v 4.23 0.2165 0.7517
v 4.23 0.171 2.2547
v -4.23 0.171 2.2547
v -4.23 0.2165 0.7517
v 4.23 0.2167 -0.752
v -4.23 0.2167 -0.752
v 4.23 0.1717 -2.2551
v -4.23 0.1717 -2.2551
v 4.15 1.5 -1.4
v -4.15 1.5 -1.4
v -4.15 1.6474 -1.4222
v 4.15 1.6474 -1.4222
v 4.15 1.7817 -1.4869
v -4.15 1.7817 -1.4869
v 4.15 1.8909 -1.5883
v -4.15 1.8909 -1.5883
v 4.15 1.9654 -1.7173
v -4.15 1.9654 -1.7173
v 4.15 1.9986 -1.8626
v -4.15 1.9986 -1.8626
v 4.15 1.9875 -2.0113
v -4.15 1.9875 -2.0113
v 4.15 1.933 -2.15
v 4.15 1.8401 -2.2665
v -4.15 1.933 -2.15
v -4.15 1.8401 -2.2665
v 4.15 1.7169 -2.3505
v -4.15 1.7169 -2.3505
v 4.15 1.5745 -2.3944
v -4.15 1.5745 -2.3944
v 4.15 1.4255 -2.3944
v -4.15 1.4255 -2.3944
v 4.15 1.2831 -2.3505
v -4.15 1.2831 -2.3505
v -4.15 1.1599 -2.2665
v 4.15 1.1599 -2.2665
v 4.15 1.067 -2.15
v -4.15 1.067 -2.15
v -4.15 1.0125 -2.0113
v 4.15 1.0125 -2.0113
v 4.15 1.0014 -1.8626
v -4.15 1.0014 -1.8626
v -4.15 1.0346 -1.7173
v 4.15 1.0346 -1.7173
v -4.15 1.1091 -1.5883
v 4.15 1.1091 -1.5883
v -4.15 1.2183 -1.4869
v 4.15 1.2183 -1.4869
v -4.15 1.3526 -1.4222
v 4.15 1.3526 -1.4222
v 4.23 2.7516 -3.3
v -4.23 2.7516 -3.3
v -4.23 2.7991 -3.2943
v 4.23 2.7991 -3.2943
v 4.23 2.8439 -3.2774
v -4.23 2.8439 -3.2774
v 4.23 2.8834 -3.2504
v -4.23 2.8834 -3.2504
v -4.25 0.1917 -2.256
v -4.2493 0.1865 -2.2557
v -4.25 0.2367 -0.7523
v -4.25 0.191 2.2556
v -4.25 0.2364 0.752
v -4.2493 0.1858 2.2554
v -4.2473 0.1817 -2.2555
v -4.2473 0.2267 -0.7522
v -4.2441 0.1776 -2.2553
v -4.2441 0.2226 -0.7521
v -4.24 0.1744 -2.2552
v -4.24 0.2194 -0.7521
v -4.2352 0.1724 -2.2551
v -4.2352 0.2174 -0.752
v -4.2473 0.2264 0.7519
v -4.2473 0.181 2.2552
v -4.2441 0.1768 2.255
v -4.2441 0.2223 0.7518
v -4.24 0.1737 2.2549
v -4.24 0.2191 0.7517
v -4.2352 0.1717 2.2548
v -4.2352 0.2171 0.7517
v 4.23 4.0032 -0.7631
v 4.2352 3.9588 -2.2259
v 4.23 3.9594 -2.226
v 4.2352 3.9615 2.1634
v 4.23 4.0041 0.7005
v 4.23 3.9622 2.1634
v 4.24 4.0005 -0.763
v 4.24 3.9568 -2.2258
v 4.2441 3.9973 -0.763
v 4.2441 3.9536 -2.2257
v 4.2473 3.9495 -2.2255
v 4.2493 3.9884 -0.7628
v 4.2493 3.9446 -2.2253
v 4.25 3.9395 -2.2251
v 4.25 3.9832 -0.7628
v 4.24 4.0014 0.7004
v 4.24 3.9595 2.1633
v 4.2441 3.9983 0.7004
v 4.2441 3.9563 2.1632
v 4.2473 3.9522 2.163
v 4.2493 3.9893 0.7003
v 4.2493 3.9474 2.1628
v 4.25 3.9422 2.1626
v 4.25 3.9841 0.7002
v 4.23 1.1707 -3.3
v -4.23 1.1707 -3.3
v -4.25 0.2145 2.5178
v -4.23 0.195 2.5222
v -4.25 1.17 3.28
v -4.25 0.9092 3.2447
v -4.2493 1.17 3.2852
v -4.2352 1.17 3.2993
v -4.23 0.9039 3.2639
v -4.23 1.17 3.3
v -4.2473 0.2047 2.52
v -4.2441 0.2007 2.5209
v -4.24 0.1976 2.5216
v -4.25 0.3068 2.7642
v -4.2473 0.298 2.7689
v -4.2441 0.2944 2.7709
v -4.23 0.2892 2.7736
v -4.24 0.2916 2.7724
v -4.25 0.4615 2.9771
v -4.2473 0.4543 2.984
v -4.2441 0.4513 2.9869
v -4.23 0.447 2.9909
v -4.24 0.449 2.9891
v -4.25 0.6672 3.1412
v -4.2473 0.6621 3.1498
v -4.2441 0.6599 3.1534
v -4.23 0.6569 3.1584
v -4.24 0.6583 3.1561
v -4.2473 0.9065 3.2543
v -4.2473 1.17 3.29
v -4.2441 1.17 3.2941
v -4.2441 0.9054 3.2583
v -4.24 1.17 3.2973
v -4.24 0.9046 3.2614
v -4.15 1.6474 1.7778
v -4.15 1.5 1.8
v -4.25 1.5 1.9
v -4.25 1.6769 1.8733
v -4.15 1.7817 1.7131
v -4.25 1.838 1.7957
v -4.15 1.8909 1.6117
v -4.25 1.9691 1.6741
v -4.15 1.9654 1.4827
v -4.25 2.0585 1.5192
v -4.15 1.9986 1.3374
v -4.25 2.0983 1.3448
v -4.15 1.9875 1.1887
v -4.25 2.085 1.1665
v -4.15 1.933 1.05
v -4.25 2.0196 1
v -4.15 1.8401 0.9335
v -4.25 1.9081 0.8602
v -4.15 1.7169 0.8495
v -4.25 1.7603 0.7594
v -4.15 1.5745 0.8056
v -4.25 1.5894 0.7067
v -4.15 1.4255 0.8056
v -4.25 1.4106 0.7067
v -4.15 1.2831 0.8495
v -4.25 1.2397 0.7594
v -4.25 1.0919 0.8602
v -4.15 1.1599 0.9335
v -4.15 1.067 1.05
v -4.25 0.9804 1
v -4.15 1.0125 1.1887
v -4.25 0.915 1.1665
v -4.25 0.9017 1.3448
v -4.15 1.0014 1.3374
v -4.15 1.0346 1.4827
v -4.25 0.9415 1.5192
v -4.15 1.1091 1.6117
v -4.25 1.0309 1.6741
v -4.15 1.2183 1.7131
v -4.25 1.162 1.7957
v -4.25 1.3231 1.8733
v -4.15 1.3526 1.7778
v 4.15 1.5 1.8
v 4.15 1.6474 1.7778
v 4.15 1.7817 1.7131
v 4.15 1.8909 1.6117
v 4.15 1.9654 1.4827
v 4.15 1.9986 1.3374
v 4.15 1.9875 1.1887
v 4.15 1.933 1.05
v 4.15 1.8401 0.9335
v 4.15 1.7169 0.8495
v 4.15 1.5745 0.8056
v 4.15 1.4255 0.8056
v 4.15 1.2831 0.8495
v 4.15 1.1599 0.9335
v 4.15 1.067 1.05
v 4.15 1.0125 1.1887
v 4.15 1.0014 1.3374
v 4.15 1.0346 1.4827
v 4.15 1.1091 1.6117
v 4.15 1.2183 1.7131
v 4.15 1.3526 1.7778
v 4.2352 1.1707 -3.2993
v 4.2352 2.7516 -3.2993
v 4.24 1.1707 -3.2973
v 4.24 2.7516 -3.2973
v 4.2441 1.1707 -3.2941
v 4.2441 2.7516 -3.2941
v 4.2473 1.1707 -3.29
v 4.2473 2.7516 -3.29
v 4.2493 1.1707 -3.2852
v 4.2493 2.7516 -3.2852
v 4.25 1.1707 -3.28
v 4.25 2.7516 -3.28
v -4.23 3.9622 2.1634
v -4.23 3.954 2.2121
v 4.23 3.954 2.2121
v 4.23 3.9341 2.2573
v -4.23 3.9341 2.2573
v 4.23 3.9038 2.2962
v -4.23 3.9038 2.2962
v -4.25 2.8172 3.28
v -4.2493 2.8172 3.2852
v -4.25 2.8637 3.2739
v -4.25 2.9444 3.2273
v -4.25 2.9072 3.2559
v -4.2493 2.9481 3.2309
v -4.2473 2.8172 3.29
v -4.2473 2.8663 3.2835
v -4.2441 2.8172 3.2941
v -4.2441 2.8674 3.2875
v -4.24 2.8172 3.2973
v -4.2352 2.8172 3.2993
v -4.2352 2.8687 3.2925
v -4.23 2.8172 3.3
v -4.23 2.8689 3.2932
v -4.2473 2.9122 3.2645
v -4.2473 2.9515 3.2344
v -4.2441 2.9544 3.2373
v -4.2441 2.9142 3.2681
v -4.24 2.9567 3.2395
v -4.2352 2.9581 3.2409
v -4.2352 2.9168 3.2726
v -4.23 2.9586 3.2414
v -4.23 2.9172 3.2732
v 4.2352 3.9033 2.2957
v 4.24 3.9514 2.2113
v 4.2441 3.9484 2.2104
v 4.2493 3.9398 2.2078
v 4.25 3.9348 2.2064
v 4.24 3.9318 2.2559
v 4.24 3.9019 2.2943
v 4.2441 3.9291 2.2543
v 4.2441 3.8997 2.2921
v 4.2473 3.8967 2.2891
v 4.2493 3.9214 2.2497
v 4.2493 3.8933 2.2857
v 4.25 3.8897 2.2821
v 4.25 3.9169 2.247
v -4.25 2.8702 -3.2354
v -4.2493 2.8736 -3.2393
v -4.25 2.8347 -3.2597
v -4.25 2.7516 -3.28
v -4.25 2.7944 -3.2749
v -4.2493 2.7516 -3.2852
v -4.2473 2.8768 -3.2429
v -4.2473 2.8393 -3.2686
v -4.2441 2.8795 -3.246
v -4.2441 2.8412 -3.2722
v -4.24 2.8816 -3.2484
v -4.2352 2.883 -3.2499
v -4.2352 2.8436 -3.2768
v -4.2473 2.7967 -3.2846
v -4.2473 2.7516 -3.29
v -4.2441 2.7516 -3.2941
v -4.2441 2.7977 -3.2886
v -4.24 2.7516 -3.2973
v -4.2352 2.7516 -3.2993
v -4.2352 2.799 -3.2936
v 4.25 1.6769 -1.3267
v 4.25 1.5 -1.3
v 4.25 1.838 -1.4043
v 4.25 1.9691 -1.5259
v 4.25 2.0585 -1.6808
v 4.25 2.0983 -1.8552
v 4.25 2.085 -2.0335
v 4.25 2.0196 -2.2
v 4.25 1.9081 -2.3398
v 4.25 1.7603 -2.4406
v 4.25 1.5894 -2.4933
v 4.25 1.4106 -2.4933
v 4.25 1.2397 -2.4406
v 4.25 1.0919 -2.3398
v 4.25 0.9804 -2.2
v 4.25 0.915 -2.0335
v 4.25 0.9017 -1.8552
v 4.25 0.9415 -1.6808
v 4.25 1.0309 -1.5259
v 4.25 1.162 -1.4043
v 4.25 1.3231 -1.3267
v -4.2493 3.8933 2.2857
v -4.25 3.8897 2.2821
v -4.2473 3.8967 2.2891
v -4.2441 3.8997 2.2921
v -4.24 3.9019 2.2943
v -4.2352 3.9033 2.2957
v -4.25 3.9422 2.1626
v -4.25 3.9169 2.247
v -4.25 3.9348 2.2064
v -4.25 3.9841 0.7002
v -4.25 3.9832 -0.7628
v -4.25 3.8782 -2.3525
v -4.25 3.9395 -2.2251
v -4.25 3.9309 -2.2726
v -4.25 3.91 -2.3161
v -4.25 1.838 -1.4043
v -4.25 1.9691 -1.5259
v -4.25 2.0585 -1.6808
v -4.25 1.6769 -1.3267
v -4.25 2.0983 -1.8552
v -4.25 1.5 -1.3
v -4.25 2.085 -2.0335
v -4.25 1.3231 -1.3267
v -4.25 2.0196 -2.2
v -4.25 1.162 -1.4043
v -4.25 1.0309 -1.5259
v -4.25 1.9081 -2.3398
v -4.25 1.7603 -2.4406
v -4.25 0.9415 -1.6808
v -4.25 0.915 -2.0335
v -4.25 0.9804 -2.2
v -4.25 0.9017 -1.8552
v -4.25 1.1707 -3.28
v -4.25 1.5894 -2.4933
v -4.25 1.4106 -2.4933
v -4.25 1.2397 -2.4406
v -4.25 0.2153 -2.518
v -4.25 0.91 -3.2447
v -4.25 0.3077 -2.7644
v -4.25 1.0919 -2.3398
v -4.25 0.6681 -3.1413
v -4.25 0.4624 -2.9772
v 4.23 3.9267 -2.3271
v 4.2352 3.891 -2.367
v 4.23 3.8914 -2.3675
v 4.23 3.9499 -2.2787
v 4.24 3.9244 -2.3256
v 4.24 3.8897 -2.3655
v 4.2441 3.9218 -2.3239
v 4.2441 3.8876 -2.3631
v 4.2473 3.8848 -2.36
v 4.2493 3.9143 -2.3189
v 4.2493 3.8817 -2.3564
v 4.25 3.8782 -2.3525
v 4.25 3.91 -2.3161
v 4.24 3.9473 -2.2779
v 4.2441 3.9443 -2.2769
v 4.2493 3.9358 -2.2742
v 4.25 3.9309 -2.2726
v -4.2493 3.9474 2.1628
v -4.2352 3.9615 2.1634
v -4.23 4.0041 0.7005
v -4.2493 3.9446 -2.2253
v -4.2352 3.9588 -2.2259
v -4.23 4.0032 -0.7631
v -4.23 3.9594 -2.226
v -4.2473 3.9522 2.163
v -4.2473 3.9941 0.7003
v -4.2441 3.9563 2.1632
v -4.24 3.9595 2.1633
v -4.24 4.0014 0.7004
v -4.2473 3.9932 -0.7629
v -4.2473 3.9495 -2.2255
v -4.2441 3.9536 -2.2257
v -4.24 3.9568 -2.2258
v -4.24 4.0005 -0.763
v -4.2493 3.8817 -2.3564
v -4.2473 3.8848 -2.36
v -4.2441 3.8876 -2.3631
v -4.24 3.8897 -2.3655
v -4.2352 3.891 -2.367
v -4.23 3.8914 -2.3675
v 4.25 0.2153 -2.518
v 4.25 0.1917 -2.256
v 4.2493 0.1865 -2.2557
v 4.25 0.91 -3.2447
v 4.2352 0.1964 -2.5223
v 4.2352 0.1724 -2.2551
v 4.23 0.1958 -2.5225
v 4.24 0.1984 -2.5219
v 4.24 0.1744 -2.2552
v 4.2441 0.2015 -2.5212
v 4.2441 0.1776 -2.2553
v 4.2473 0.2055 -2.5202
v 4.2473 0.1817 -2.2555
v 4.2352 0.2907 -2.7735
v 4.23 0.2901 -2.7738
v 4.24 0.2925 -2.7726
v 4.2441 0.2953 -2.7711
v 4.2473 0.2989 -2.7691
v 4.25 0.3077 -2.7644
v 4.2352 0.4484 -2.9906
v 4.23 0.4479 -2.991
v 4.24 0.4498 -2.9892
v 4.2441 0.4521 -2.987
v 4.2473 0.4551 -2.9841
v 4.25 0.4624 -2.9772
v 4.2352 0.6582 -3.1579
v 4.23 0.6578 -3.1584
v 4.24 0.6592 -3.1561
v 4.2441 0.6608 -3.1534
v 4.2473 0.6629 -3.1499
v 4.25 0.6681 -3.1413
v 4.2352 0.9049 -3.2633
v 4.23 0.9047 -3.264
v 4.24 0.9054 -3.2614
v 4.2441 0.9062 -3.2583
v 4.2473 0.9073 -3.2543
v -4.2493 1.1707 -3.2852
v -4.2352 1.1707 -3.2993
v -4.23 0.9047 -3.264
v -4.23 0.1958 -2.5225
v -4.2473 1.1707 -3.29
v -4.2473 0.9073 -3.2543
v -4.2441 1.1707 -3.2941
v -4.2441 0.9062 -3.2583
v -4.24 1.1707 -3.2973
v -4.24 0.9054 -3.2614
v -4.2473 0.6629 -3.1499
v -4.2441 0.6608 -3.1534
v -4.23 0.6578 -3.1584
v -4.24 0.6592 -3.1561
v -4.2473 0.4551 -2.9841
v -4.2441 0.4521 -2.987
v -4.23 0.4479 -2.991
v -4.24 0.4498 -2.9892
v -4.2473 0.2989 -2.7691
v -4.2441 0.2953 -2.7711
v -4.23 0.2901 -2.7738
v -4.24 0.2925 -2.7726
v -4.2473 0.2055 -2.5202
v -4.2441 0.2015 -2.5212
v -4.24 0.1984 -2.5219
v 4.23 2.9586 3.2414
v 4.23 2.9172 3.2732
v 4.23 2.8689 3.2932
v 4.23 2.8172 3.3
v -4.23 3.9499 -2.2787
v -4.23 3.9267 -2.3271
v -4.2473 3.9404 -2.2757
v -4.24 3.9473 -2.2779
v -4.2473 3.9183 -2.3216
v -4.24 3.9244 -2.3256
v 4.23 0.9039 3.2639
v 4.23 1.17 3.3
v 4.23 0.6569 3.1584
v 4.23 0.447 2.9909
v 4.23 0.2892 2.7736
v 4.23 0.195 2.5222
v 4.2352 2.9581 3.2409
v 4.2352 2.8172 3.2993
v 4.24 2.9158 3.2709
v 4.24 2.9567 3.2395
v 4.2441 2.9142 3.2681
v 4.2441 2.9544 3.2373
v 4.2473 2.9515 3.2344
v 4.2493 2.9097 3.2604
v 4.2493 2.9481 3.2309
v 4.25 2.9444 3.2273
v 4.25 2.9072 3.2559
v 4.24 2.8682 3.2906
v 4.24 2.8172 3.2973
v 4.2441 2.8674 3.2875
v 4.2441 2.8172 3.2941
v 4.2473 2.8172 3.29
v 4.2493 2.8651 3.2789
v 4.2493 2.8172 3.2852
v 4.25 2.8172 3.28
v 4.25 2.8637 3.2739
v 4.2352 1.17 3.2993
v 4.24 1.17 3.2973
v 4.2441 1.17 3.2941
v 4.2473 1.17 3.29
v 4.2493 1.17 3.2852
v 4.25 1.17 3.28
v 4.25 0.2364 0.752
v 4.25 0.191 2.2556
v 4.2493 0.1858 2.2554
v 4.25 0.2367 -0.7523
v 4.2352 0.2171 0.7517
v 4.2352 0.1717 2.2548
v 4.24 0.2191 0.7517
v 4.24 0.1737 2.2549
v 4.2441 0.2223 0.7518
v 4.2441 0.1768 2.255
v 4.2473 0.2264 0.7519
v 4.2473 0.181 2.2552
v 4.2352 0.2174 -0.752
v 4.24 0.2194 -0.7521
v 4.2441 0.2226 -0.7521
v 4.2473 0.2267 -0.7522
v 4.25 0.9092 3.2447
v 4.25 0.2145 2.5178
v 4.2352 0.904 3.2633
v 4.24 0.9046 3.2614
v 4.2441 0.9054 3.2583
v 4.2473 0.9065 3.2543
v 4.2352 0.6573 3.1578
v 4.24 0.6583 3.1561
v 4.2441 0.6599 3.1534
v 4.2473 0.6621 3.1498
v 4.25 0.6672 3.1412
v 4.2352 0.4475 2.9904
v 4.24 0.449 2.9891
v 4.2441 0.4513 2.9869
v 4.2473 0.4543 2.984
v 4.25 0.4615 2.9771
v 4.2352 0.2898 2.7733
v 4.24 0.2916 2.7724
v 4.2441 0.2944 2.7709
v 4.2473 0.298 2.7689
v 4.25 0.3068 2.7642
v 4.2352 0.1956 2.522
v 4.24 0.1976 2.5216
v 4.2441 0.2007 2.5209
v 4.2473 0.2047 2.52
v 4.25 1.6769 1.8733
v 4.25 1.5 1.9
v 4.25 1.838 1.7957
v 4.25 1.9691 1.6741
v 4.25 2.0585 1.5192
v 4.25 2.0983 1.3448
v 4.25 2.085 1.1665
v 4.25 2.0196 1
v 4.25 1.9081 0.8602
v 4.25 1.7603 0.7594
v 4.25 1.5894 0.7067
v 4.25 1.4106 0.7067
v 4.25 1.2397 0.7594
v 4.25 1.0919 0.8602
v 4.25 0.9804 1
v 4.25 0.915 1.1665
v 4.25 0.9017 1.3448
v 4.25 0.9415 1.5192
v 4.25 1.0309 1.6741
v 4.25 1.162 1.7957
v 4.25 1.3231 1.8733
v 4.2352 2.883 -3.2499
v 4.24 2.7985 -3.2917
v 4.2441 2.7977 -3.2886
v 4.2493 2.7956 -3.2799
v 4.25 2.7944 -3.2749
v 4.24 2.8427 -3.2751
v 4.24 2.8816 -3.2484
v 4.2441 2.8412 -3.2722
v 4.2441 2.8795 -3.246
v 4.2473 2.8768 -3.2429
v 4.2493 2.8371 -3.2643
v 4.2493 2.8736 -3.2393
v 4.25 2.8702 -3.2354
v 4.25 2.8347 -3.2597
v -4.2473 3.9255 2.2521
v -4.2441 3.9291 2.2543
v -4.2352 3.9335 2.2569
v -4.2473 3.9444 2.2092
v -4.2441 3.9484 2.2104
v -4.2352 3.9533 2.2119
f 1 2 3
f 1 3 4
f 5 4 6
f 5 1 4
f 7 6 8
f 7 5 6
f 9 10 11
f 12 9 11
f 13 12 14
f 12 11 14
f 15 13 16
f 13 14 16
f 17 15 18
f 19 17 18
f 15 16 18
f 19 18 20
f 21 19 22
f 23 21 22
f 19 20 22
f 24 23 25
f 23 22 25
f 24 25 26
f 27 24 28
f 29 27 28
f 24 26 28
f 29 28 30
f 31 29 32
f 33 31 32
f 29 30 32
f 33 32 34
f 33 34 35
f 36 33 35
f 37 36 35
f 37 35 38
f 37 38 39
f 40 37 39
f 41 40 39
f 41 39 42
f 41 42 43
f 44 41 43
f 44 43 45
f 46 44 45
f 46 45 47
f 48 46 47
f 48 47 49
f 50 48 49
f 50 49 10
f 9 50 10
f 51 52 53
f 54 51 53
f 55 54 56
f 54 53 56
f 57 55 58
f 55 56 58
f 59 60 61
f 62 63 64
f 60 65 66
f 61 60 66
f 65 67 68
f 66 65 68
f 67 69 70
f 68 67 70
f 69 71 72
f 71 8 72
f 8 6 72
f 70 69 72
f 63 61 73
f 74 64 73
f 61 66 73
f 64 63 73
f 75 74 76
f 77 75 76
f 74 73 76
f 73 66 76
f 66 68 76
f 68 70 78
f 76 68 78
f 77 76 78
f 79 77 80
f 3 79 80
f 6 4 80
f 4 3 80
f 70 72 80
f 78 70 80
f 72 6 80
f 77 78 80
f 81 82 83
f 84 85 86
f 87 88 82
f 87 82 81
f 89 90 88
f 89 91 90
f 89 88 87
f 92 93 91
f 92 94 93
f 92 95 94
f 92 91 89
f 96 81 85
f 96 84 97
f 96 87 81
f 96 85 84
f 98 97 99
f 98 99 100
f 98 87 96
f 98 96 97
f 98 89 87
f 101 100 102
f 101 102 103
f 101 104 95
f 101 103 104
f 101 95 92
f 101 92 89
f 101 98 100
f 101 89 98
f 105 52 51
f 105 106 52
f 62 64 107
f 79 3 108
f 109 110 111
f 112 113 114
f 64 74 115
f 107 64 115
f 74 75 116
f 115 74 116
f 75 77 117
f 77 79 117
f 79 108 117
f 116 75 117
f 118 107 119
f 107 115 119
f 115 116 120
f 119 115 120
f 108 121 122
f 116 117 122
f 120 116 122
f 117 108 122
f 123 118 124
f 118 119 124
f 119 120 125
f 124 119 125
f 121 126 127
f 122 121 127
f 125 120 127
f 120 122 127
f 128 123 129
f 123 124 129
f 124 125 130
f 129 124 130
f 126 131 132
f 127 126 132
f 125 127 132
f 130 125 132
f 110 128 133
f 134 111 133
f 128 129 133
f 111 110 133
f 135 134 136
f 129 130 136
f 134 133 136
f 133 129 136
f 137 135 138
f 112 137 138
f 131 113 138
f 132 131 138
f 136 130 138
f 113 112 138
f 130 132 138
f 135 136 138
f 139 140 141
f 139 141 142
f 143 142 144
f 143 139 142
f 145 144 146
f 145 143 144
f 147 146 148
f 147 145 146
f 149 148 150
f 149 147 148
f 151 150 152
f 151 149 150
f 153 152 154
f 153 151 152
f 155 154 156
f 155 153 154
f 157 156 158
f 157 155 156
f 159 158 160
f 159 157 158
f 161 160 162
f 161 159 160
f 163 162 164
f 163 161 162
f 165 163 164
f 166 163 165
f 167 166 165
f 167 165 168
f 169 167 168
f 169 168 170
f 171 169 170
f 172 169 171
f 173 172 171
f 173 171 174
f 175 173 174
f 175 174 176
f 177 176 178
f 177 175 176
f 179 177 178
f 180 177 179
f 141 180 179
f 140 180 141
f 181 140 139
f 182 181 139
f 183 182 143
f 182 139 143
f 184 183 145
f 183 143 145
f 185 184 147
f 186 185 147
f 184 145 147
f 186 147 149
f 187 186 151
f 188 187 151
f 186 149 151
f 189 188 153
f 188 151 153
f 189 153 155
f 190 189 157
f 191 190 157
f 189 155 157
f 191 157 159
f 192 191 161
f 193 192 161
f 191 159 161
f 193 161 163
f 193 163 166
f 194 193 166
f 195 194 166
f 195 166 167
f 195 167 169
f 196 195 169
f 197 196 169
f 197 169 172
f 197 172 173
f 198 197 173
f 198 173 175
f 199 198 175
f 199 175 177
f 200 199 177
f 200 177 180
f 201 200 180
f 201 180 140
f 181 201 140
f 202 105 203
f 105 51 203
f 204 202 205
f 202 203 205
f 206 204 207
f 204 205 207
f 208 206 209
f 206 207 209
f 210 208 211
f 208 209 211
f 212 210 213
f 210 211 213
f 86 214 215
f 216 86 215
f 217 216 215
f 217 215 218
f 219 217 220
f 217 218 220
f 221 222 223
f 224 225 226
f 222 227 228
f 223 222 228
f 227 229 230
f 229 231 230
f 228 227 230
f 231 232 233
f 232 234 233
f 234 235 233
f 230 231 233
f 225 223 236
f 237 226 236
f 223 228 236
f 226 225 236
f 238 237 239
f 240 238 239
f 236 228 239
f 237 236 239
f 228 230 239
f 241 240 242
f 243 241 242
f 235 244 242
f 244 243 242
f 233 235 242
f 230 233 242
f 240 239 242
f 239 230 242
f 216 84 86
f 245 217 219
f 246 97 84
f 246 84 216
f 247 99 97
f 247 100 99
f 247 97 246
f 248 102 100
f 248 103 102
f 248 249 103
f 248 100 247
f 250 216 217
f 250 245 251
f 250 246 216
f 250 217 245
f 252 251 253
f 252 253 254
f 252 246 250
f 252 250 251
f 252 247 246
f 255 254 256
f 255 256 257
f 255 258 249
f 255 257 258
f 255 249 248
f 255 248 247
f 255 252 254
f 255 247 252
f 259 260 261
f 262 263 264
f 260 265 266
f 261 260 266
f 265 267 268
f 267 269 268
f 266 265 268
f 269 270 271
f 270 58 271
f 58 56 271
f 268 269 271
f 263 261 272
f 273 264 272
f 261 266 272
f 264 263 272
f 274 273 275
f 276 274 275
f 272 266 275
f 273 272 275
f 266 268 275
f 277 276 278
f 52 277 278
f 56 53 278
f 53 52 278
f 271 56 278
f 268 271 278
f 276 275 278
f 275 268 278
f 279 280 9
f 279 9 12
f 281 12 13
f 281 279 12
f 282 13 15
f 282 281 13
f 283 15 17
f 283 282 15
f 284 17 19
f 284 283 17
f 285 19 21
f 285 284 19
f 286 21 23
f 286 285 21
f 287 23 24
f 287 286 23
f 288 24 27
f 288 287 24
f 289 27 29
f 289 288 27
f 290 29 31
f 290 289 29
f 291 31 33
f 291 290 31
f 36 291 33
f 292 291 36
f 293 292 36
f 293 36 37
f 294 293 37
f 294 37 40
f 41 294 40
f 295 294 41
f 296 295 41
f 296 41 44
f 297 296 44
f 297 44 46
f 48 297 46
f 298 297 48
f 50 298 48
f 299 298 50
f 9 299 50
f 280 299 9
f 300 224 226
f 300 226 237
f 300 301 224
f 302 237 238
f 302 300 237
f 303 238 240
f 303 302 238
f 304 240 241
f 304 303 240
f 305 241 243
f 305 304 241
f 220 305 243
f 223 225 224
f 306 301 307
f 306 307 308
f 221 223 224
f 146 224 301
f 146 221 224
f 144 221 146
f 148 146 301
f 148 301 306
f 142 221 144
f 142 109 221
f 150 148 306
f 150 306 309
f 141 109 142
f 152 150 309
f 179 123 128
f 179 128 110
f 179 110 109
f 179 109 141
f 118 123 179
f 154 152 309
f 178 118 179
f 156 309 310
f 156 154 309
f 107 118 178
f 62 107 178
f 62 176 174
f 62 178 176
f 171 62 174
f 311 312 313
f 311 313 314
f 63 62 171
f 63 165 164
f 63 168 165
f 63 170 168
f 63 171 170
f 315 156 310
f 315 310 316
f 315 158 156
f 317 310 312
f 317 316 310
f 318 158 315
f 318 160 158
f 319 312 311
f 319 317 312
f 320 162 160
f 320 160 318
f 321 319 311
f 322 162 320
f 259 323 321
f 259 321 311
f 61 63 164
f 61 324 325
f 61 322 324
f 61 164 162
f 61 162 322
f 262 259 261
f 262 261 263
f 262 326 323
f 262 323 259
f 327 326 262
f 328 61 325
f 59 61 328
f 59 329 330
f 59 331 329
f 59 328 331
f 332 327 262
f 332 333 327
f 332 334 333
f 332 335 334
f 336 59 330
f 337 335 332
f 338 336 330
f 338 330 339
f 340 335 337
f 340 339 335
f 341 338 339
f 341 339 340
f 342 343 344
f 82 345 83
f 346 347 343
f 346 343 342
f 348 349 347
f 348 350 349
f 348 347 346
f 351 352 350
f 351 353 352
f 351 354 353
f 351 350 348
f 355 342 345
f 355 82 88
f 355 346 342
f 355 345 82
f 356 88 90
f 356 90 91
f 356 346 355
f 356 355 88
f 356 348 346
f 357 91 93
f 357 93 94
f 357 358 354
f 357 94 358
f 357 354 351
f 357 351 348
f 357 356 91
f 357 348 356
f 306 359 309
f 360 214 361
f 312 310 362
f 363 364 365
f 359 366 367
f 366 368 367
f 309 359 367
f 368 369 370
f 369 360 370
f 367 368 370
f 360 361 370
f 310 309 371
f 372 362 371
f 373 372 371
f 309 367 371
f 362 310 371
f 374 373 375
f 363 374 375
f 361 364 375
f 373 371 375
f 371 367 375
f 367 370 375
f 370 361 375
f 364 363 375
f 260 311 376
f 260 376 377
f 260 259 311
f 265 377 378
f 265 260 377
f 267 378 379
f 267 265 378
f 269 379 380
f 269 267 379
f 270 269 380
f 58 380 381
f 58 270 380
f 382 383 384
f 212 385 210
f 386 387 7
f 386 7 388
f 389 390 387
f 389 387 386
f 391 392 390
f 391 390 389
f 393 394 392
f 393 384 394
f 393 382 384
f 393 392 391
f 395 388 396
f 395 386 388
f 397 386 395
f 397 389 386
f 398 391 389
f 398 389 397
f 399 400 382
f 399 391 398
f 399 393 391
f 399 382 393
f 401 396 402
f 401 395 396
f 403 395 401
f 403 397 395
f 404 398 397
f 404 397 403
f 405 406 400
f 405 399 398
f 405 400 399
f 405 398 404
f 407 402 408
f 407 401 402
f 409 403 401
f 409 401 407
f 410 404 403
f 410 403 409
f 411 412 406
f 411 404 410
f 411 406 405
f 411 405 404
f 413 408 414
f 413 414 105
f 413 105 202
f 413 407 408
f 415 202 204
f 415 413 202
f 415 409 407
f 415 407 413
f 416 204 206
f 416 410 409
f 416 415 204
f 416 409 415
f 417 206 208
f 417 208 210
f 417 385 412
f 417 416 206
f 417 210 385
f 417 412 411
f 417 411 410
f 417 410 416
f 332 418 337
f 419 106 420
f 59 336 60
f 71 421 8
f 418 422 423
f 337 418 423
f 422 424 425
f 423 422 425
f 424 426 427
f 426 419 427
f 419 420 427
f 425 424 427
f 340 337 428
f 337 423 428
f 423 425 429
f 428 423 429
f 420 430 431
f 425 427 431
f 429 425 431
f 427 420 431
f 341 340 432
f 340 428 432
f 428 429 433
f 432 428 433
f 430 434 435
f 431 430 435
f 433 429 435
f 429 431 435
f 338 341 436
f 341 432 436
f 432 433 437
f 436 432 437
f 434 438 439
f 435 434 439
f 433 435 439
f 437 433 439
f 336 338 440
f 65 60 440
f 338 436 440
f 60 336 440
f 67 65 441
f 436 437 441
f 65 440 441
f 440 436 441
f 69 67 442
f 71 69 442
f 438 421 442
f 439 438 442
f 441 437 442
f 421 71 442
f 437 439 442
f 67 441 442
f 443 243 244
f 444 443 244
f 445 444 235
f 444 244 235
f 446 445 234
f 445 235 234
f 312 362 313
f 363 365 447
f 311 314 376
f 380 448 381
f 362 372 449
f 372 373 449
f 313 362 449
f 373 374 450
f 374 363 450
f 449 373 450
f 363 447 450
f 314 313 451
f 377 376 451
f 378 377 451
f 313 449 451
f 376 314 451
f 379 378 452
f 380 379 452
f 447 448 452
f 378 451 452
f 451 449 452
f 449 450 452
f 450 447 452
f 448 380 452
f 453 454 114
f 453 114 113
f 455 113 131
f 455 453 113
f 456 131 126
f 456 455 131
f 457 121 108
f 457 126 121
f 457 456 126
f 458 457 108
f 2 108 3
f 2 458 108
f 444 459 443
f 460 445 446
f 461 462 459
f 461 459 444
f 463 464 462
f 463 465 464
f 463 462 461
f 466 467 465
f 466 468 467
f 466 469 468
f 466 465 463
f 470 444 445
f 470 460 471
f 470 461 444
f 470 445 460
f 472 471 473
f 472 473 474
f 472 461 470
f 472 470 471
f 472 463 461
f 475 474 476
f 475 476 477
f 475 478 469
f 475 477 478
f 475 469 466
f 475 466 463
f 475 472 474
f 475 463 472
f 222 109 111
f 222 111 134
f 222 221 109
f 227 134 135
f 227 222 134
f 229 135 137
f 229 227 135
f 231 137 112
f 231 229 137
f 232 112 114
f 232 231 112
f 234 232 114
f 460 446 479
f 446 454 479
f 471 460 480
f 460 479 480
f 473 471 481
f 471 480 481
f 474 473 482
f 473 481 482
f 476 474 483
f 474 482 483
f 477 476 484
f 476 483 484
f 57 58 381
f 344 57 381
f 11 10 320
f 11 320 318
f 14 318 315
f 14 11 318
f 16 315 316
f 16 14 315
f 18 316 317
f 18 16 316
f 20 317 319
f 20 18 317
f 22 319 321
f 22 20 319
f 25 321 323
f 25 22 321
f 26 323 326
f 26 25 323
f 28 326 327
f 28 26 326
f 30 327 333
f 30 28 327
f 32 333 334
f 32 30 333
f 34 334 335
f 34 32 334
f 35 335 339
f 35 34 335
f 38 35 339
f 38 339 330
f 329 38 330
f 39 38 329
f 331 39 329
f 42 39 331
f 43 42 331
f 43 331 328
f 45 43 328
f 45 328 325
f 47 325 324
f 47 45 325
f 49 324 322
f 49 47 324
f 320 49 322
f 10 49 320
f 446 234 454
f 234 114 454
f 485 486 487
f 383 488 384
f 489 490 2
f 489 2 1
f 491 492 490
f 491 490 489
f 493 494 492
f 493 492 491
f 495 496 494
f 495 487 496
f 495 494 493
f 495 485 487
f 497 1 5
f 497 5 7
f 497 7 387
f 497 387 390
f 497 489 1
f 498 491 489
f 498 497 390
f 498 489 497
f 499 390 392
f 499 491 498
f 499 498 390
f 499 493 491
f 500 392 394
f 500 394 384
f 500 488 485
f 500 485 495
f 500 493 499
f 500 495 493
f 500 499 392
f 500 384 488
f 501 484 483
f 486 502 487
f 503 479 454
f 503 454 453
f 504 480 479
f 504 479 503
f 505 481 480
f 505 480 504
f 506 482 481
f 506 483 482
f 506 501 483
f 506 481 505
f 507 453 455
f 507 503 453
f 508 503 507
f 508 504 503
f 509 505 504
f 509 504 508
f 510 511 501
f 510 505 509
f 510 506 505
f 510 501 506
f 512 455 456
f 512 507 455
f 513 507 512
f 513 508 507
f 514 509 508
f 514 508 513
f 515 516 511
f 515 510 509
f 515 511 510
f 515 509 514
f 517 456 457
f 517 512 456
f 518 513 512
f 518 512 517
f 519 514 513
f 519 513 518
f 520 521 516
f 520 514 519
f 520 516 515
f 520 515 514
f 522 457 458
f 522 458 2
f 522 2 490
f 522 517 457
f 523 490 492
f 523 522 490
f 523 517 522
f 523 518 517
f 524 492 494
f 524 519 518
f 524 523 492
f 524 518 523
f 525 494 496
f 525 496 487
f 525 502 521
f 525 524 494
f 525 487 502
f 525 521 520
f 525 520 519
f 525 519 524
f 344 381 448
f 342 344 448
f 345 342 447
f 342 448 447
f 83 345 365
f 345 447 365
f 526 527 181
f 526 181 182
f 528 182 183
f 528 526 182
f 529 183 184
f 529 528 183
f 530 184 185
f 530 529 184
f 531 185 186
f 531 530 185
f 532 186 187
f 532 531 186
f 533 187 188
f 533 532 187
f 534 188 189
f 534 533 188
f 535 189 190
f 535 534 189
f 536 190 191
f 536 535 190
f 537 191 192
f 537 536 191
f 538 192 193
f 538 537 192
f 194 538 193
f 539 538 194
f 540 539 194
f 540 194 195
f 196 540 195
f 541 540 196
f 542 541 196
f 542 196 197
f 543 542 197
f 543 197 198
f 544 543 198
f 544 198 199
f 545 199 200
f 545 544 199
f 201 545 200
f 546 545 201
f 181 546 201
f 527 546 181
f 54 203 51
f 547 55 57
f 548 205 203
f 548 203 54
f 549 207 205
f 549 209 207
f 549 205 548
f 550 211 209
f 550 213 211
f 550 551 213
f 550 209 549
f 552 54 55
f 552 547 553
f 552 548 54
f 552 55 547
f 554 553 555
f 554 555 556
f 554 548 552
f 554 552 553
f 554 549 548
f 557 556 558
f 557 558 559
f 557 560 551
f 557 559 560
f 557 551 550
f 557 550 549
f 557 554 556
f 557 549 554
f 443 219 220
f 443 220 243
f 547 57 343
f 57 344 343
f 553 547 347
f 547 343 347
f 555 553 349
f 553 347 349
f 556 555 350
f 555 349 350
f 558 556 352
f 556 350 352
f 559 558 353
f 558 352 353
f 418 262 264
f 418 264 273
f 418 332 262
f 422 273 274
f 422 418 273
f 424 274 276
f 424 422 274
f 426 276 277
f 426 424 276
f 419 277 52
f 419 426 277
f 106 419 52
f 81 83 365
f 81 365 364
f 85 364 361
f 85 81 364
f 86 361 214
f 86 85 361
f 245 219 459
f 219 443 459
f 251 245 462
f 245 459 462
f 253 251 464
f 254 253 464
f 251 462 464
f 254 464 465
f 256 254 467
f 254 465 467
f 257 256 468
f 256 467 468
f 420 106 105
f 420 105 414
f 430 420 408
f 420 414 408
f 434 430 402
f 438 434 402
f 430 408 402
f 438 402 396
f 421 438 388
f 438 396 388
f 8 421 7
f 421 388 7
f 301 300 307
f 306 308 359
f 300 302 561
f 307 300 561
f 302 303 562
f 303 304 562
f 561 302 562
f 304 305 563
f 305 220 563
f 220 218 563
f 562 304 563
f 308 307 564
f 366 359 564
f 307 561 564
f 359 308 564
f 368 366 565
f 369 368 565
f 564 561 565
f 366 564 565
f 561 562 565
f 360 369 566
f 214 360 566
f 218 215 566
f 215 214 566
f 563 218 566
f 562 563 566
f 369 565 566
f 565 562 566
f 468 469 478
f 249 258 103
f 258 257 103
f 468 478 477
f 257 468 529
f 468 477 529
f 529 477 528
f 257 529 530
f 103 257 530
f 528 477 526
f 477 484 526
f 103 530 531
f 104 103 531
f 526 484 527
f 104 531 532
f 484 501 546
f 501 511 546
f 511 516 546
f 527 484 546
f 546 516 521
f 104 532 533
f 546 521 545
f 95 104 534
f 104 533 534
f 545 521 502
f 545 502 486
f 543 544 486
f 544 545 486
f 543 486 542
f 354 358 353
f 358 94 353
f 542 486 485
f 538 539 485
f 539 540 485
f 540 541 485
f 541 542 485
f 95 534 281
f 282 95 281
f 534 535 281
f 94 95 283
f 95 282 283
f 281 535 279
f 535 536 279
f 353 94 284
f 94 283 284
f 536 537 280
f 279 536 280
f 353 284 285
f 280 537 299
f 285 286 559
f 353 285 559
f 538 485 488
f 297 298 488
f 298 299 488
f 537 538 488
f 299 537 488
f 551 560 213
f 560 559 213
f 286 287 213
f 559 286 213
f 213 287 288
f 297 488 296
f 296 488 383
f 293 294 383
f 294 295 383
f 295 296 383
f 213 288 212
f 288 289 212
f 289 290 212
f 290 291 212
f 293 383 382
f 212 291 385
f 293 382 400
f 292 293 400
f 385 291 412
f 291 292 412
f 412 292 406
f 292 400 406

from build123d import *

# Parameters (mm, degrees)
SKETCH1_W           = 8.5
SKETCH1_H           = 6.6
BOSS_EXTRUDE1_DEPTH = 4.2
CUT_EXTRUDE1_DEPTH  = 14.2
CHAMFER1_SIZE       = 1.073169072
CHAMFER1_SIZE_2     = 1
FILLET1_R           = 1
FILLET2_R           = 0.2
FILLET3_R           = 0.02
SKETCH3_R           = 0.5
CUT_EXTRUDE2_DEPTH  = 14.2
CHAMFER2_SIZE       = 0.1


with BuildPart() as part:
    # Sketch1 → Boss-Extrude1 (new body)
    with BuildSketch(Plane(origin=(0, 0, 0), x_dir=(1, 0, 0), z_dir=(0, 1, 0))):
        Rectangle(SKETCH1_W, SKETCH1_H)
    extrude(amount=BOSS_EXTRUDE1_DEPTH)

    # Sketch2 → Cut-Extrude1 (cut)
    with BuildSketch(Plane(origin=(4.25, 0, 0), x_dir=(0, 0, -1), z_dir=(1, 0, 0))):
        with BuildLine():
            Line((-3.3, 3.9), (-5.253535024, 5.241651662))
            Line((-5.253535024, 5.241651662), (3.889156526, 7.141243929))
            Line((3.889156526, 7.141243929), (5.679183493, 5.077233243))
            Line((5.679183493, 5.077233243), (3.3, 3.9))
            ThreePointArc((3.3, 3.9), (0, 4.009018851), (-3.3, 3.9))
        make_face()
        with BuildLine():
            Line((4.717394395, 0), (0, -2.904825783))
            Line((0, -2.904825783), (-4.70037365, 0))
            ThreePointArc((-4.70037365, 0), (0.008510373, 0.222229748), (4.717394395, 0))
        make_face()
    extrude(amount=-CUT_EXTRUDE1_DEPTH, mode=Mode.SUBTRACT)

    # Chamfer1
    # the kernel refuses this chamfer: 1.073169072, 1 mm, written as the material it takes off along each edge
    with BuildSketch(Plane(origin=(7.014554566, 3.9, -3.3), x_dir=(0, -1, 0), z_dir=(-1, 0, 0))) as chamfer1_piece_1:
        with BuildLine():
            Line((CHAMFER1_SIZE, 0), (-0.05556839, 0.98868238))
            ThreePointArc((-0.05556839, 0.98868238), (-0.031072564, 0.509202078), (0, 0))
            Line((0, 0), (CHAMFER1_SIZE, 0))
        make_face()
    extrude(amount=14.029109133, mode=Mode.SUBTRACT)
    with BuildSketch(Plane(origin=(6.981889399, 3.9, 3.3), x_dir=(0, 0.05541549441613883, -0.9984633808901632), z_dir=(-1, 0, 0))) as chamfer1_piece_2:
        with BuildLine():
            Line((1.060391539, 0), (-CHAMFER1_SIZE_2 * 0.0554154944161, CHAMFER1_SIZE_2 * 0.99846338089))
            Line((-CHAMFER1_SIZE_2 * 0.0554154944161, CHAMFER1_SIZE_2 * 0.99846338089), (0, 0))
            ThreePointArc((0, 0), (0.546186707, -0.002808597), (1.060391539, 0))
        make_face()
    extrude(amount=13.963778797, mode=Mode.SUBTRACT)

    # Fillet1
    fillet1_edges = [part.edges().sort_by_distance(p)[0] for p in [
        (0, 0.11377308, -3.3),
        (0, 0.112647256, 3.3),
    ]]
    fillet(fillet1_edges, radius=FILLET1_R)

    # Fillet2
    fillet2_edges = [part.edges().sort_by_distance(p)[0] for p in [
        (0, 2.826830928, -3.3),
        (0, 3.958762121, 2.241237879),
        (0, 3.95556839, -2.31131762),
        (0, 2.9, 3.3),
    ]]
    fillet(fillet2_edges, radius=FILLET2_R)

    # Fillet3
    fillet3_edges = [part.edges().sort_by_distance(p)[0] for p in [
        (4.25, 0.22222905, -0.000158372),
        (4.25, 0.447906277, -2.99103865),
        (4.25, 0.447022472, 2.990917901),
        (-4.25, 0.22222905, -0.000158372),
        (-4.25, 0.447906277, -2.99103865),
        (-4.25, 0.447022472, 2.990917901),
        (4.25, 1.961174313, -3.3),
        (-4.25, 1.961174313, -3.3),
        (4.25, 1.993556495, 3.3),
        (4.25, 3.387413237, -2.808975408),
        (4.25, 4.009009057, -0.031295116),
        (4.25, 3.431189943, 2.768810057),
        (4.25, 2.893693974, 3.284775907),
        (4.25, 3.94545632, 2.235294601),
        (4.25, 3.939907453, -2.30368815),
        (4.25, 2.822018564, -3.287202247),
        (-4.25, 3.387413237, -2.808975408),
        (-4.25, 1.993556495, 3.3),
        (-4.25, 3.431189943, 2.768810057),
        (-4.25, 4.009009057, -0.031295116),
        (-4.25, 2.893693974, 3.284775907),
        (-4.25, 3.94545632, 2.235294601),
        (-4.25, 3.939907453, -2.30368815),
        (-4.25, 2.822018564, -3.287202247),
    ]]
    fillet(fillet3_edges, radius=FILLET3_R)

    # Sketch3 → Cut-Extrude2 (cut)
    with BuildSketch(Plane.ZY.offset(4.25)):
        with Locations((-1.9, 1.5)):
            Circle(SKETCH3_R)
        with Locations((1.3, 1.5)):
            Circle(SKETCH3_R)
    extrude(amount=-CUT_EXTRUDE2_DEPTH, mode=Mode.SUBTRACT)

    # Chamfer2
    chamfer2_edges = [part.edges().sort_by_distance(p)[0] for p in [
        (4.25, 1.5, -2.4),
        (-4.25, 1.5, -2.4),
        (4.25, 1.5, 0.8),
        (-4.25, 1.5, 0.8),
    ]]
    chamfer(chamfer2_edges, length=CHAMFER2_SIZE)


solid = part.part
